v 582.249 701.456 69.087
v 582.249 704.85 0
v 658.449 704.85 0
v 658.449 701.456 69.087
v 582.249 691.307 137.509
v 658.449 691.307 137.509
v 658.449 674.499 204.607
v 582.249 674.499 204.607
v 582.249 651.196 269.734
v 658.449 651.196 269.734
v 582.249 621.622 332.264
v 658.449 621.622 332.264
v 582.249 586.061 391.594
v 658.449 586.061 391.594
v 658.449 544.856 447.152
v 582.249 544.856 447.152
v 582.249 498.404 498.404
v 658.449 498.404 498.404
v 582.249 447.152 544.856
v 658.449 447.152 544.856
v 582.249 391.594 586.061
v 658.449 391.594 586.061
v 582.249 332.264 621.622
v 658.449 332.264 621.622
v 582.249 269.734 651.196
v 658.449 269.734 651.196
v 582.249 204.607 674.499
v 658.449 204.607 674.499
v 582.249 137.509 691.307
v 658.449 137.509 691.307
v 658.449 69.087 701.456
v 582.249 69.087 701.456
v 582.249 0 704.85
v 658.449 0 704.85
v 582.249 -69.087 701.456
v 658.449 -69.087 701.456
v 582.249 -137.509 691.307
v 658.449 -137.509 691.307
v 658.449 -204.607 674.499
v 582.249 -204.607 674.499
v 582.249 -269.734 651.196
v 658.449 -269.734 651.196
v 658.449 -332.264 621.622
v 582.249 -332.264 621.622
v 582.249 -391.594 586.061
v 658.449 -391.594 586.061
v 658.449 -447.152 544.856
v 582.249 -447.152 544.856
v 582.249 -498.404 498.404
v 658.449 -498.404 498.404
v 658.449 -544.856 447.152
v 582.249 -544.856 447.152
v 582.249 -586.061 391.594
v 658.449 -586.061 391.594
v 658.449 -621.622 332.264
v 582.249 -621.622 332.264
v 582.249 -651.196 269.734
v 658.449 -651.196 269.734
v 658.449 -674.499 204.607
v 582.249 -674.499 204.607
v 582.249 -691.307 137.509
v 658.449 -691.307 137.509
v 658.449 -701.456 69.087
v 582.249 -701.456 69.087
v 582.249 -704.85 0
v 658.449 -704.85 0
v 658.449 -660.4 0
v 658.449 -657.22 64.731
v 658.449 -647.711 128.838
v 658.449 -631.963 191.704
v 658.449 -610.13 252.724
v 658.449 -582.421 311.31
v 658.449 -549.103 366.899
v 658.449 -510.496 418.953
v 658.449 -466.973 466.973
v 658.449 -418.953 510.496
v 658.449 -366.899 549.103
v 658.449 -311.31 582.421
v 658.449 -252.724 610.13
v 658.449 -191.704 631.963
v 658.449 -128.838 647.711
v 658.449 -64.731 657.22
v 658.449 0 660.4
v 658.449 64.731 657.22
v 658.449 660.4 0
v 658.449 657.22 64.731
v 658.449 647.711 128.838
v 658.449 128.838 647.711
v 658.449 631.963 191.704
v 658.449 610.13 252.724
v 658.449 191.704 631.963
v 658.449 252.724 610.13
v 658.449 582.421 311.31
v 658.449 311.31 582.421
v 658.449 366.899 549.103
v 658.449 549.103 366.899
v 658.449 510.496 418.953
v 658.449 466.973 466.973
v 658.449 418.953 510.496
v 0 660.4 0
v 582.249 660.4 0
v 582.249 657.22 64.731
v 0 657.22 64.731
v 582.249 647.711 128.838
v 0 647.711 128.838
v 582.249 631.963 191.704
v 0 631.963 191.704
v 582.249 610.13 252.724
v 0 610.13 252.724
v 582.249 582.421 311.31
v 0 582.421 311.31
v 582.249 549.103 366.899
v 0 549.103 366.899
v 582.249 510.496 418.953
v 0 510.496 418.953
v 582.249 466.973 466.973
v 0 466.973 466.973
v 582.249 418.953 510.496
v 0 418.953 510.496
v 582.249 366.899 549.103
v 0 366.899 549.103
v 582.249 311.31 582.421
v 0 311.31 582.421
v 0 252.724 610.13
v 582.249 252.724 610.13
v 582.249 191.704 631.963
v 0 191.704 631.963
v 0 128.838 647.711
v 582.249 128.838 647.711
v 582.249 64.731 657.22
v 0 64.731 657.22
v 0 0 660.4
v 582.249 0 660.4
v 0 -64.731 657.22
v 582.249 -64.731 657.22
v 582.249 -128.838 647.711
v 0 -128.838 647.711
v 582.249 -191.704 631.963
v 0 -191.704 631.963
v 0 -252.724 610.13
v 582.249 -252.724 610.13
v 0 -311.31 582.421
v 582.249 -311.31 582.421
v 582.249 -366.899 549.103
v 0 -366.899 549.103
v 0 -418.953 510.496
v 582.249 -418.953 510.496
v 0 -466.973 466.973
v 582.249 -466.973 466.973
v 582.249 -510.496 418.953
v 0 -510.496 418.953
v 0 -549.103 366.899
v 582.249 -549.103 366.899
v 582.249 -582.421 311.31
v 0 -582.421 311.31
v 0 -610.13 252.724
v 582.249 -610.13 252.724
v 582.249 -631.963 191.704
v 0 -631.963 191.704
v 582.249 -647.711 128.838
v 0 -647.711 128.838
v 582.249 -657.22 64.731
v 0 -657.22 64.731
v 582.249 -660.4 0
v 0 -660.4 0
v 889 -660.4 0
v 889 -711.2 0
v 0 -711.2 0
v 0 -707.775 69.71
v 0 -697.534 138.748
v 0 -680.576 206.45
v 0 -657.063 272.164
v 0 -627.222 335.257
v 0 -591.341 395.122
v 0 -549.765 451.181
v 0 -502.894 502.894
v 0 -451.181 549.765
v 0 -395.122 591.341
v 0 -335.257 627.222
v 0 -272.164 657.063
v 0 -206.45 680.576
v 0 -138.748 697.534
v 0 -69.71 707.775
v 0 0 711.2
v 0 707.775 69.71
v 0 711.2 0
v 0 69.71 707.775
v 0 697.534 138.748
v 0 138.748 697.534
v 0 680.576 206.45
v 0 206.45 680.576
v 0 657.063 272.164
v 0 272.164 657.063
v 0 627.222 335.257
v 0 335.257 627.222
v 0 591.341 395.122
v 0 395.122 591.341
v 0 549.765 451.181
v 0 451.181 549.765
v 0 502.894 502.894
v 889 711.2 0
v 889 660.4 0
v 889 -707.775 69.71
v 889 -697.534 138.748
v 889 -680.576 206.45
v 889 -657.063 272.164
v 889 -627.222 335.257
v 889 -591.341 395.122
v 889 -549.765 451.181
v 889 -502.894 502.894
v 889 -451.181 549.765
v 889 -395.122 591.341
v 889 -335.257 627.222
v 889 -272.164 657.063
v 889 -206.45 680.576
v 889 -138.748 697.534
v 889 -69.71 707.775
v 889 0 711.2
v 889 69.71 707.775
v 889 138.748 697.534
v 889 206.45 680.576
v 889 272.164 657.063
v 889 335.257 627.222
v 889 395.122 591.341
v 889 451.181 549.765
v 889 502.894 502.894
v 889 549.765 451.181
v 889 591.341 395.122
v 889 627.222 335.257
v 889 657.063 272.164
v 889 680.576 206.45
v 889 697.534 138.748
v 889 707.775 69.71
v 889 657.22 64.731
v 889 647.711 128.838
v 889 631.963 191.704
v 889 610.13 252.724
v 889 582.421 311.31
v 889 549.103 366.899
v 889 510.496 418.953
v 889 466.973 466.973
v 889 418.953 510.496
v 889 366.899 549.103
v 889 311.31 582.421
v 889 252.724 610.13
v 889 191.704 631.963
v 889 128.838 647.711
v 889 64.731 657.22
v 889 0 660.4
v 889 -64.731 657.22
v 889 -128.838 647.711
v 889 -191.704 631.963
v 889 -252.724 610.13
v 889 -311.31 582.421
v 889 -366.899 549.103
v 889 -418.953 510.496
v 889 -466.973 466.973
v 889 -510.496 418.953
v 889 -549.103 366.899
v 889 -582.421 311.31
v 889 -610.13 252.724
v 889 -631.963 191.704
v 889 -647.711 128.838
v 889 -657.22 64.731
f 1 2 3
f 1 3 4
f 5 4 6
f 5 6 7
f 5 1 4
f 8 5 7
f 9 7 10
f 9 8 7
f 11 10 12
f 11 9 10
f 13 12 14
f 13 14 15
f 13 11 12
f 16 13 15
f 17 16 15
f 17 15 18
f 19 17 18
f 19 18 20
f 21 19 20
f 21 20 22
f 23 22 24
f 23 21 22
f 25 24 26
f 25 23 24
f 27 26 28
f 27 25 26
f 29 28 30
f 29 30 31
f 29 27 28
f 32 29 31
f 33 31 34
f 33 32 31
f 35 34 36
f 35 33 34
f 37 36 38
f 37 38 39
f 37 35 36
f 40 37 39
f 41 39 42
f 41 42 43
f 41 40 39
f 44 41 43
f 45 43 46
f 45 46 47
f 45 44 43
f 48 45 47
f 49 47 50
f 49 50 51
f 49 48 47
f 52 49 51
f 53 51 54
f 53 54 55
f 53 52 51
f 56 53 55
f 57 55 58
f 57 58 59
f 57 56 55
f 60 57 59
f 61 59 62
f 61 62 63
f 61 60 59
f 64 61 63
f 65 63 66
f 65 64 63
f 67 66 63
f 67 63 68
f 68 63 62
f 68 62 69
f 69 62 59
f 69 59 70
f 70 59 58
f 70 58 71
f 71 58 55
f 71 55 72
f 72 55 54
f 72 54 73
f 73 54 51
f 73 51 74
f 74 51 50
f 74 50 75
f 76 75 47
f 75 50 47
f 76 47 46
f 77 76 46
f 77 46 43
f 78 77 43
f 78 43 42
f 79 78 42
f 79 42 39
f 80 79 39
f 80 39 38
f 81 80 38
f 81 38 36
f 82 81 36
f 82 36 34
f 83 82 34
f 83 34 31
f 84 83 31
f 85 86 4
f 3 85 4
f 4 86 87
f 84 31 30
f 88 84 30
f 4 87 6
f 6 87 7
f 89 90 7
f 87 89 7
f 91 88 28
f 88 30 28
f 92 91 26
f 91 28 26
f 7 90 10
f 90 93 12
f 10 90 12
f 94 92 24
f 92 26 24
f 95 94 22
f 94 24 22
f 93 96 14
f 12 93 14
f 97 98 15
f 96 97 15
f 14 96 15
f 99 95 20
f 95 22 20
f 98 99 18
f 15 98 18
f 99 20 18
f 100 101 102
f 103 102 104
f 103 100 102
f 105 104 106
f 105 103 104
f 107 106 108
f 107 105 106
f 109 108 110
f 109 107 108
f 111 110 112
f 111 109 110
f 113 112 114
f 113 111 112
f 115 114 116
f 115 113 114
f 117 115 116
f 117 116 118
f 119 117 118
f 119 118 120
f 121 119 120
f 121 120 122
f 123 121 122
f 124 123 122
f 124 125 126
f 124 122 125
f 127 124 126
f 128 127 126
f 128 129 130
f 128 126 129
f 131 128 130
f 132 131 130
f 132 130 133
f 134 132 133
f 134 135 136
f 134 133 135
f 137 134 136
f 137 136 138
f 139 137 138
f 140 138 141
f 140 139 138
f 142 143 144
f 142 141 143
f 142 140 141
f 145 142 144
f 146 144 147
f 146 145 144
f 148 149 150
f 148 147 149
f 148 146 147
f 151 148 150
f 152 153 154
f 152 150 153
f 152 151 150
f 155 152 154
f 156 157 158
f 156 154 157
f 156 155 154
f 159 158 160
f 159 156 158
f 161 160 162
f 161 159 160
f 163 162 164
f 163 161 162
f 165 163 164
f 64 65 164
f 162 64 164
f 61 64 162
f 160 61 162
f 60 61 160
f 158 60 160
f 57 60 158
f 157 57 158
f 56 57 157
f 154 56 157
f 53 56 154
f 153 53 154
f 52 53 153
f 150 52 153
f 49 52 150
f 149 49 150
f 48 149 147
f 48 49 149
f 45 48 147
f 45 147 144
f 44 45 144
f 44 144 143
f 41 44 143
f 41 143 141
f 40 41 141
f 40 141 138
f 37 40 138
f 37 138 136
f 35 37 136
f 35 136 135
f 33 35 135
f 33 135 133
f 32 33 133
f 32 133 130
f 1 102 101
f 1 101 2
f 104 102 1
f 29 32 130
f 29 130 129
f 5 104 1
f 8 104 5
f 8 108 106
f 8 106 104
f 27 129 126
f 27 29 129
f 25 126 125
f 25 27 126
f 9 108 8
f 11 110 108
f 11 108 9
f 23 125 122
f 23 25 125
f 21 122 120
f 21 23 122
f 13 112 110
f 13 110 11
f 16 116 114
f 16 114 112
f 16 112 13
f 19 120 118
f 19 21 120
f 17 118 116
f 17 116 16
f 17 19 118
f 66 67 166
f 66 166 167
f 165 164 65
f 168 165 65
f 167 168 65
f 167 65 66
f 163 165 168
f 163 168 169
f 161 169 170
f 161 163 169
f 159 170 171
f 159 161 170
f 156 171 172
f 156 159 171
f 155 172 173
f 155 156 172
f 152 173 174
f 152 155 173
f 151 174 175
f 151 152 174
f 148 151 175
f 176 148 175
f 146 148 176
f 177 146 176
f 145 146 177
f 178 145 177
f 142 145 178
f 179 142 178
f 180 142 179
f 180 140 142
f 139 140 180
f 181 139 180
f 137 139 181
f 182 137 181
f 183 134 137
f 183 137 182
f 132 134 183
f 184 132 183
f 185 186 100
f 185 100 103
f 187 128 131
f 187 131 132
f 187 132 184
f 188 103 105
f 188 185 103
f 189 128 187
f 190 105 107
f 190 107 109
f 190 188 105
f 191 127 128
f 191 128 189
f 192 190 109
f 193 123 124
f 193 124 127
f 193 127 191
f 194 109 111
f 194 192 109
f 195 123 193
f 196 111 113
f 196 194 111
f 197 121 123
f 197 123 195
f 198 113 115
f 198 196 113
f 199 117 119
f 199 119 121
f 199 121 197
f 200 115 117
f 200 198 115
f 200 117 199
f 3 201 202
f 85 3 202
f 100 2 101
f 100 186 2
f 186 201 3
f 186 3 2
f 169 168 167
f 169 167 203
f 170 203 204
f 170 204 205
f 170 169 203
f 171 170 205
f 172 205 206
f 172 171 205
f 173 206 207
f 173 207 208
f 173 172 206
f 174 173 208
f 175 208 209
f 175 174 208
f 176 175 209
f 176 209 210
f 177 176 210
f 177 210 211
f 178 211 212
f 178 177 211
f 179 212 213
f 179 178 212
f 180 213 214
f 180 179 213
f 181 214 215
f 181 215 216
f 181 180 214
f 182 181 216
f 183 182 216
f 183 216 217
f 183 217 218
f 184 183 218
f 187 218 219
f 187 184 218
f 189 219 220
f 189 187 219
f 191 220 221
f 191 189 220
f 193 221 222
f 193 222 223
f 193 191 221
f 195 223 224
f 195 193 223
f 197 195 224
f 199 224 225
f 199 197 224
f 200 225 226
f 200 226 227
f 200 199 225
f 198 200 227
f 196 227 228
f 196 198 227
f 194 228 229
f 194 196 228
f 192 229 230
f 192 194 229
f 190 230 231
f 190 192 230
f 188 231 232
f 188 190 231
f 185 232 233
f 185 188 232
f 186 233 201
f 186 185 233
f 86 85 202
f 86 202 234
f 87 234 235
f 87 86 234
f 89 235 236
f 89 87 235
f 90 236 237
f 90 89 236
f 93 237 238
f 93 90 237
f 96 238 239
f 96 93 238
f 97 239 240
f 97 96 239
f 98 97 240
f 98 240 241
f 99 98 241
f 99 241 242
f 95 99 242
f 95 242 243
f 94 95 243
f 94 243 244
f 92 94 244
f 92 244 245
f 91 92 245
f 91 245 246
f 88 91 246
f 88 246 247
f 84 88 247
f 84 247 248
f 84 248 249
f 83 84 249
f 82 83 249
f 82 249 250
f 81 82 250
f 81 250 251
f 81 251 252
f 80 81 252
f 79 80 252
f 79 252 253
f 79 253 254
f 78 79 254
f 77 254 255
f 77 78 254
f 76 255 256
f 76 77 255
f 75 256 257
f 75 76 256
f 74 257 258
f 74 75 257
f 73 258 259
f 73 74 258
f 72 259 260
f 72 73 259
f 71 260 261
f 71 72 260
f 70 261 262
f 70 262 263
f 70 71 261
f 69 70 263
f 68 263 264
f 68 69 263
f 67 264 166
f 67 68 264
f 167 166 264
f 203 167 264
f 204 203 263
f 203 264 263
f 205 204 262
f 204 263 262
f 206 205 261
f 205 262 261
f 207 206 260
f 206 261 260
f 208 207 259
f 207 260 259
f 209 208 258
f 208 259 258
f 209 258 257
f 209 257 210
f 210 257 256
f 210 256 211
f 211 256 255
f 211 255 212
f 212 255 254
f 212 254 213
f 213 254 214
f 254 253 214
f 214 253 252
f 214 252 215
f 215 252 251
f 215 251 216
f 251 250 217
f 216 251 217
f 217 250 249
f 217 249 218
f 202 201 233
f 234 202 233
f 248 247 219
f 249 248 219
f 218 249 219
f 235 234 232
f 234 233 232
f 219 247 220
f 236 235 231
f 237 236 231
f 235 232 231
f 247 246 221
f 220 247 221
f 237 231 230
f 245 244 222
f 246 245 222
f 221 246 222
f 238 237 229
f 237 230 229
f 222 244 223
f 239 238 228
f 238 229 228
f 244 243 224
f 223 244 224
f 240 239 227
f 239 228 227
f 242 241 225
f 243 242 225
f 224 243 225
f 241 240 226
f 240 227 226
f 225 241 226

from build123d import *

# Parameters (mm, degrees)
BOSS_EXTRUDE1_DEPTH = 889
CAVITY1_START       = 582.248938238
CAVITY1_DEPTH       = 76.2


# Read off the part's stored shape, not the designer's step: Cavity1
with BuildPart() as part:
    # Sketch1 → Boss-Extrude1 (new body)
    with BuildSketch(Plane(origin=(0, 0, 0), x_dir=(0, 0, -1), z_dir=(1, 0, 0))):
        with BuildLine():
            Line((0, 711.2), (0, 660.4))
            ThreePointArc((0, 660.4), (-660.4, 0), (0, -660.4))
            Line((0, -660.4), (0, -711.2))
            ThreePointArc((0, -711.2), (-711.2, 0), (0, 711.2))
        make_face()
    extrude(amount=BOSS_EXTRUDE1_DEPTH)

    # Cavity1 outline → Cavity1 (cut)
    with BuildSketch(Plane.YZ.offset(CAVITY1_START)):
        with BuildLine():
            ThreePointArc((704.85, 0), (0, 704.85), (-704.85, 0))
            Line((-704.85, 0), (-660.4, 0))
            ThreePointArc((-660.4, 0), (0, 660.4), (660.4, 0))
            Line((660.4, 0), (704.85, 0))
        make_face()
    extrude(amount=CAVITY1_DEPTH, mode=Mode.SUBTRACT)


solid = part.part
